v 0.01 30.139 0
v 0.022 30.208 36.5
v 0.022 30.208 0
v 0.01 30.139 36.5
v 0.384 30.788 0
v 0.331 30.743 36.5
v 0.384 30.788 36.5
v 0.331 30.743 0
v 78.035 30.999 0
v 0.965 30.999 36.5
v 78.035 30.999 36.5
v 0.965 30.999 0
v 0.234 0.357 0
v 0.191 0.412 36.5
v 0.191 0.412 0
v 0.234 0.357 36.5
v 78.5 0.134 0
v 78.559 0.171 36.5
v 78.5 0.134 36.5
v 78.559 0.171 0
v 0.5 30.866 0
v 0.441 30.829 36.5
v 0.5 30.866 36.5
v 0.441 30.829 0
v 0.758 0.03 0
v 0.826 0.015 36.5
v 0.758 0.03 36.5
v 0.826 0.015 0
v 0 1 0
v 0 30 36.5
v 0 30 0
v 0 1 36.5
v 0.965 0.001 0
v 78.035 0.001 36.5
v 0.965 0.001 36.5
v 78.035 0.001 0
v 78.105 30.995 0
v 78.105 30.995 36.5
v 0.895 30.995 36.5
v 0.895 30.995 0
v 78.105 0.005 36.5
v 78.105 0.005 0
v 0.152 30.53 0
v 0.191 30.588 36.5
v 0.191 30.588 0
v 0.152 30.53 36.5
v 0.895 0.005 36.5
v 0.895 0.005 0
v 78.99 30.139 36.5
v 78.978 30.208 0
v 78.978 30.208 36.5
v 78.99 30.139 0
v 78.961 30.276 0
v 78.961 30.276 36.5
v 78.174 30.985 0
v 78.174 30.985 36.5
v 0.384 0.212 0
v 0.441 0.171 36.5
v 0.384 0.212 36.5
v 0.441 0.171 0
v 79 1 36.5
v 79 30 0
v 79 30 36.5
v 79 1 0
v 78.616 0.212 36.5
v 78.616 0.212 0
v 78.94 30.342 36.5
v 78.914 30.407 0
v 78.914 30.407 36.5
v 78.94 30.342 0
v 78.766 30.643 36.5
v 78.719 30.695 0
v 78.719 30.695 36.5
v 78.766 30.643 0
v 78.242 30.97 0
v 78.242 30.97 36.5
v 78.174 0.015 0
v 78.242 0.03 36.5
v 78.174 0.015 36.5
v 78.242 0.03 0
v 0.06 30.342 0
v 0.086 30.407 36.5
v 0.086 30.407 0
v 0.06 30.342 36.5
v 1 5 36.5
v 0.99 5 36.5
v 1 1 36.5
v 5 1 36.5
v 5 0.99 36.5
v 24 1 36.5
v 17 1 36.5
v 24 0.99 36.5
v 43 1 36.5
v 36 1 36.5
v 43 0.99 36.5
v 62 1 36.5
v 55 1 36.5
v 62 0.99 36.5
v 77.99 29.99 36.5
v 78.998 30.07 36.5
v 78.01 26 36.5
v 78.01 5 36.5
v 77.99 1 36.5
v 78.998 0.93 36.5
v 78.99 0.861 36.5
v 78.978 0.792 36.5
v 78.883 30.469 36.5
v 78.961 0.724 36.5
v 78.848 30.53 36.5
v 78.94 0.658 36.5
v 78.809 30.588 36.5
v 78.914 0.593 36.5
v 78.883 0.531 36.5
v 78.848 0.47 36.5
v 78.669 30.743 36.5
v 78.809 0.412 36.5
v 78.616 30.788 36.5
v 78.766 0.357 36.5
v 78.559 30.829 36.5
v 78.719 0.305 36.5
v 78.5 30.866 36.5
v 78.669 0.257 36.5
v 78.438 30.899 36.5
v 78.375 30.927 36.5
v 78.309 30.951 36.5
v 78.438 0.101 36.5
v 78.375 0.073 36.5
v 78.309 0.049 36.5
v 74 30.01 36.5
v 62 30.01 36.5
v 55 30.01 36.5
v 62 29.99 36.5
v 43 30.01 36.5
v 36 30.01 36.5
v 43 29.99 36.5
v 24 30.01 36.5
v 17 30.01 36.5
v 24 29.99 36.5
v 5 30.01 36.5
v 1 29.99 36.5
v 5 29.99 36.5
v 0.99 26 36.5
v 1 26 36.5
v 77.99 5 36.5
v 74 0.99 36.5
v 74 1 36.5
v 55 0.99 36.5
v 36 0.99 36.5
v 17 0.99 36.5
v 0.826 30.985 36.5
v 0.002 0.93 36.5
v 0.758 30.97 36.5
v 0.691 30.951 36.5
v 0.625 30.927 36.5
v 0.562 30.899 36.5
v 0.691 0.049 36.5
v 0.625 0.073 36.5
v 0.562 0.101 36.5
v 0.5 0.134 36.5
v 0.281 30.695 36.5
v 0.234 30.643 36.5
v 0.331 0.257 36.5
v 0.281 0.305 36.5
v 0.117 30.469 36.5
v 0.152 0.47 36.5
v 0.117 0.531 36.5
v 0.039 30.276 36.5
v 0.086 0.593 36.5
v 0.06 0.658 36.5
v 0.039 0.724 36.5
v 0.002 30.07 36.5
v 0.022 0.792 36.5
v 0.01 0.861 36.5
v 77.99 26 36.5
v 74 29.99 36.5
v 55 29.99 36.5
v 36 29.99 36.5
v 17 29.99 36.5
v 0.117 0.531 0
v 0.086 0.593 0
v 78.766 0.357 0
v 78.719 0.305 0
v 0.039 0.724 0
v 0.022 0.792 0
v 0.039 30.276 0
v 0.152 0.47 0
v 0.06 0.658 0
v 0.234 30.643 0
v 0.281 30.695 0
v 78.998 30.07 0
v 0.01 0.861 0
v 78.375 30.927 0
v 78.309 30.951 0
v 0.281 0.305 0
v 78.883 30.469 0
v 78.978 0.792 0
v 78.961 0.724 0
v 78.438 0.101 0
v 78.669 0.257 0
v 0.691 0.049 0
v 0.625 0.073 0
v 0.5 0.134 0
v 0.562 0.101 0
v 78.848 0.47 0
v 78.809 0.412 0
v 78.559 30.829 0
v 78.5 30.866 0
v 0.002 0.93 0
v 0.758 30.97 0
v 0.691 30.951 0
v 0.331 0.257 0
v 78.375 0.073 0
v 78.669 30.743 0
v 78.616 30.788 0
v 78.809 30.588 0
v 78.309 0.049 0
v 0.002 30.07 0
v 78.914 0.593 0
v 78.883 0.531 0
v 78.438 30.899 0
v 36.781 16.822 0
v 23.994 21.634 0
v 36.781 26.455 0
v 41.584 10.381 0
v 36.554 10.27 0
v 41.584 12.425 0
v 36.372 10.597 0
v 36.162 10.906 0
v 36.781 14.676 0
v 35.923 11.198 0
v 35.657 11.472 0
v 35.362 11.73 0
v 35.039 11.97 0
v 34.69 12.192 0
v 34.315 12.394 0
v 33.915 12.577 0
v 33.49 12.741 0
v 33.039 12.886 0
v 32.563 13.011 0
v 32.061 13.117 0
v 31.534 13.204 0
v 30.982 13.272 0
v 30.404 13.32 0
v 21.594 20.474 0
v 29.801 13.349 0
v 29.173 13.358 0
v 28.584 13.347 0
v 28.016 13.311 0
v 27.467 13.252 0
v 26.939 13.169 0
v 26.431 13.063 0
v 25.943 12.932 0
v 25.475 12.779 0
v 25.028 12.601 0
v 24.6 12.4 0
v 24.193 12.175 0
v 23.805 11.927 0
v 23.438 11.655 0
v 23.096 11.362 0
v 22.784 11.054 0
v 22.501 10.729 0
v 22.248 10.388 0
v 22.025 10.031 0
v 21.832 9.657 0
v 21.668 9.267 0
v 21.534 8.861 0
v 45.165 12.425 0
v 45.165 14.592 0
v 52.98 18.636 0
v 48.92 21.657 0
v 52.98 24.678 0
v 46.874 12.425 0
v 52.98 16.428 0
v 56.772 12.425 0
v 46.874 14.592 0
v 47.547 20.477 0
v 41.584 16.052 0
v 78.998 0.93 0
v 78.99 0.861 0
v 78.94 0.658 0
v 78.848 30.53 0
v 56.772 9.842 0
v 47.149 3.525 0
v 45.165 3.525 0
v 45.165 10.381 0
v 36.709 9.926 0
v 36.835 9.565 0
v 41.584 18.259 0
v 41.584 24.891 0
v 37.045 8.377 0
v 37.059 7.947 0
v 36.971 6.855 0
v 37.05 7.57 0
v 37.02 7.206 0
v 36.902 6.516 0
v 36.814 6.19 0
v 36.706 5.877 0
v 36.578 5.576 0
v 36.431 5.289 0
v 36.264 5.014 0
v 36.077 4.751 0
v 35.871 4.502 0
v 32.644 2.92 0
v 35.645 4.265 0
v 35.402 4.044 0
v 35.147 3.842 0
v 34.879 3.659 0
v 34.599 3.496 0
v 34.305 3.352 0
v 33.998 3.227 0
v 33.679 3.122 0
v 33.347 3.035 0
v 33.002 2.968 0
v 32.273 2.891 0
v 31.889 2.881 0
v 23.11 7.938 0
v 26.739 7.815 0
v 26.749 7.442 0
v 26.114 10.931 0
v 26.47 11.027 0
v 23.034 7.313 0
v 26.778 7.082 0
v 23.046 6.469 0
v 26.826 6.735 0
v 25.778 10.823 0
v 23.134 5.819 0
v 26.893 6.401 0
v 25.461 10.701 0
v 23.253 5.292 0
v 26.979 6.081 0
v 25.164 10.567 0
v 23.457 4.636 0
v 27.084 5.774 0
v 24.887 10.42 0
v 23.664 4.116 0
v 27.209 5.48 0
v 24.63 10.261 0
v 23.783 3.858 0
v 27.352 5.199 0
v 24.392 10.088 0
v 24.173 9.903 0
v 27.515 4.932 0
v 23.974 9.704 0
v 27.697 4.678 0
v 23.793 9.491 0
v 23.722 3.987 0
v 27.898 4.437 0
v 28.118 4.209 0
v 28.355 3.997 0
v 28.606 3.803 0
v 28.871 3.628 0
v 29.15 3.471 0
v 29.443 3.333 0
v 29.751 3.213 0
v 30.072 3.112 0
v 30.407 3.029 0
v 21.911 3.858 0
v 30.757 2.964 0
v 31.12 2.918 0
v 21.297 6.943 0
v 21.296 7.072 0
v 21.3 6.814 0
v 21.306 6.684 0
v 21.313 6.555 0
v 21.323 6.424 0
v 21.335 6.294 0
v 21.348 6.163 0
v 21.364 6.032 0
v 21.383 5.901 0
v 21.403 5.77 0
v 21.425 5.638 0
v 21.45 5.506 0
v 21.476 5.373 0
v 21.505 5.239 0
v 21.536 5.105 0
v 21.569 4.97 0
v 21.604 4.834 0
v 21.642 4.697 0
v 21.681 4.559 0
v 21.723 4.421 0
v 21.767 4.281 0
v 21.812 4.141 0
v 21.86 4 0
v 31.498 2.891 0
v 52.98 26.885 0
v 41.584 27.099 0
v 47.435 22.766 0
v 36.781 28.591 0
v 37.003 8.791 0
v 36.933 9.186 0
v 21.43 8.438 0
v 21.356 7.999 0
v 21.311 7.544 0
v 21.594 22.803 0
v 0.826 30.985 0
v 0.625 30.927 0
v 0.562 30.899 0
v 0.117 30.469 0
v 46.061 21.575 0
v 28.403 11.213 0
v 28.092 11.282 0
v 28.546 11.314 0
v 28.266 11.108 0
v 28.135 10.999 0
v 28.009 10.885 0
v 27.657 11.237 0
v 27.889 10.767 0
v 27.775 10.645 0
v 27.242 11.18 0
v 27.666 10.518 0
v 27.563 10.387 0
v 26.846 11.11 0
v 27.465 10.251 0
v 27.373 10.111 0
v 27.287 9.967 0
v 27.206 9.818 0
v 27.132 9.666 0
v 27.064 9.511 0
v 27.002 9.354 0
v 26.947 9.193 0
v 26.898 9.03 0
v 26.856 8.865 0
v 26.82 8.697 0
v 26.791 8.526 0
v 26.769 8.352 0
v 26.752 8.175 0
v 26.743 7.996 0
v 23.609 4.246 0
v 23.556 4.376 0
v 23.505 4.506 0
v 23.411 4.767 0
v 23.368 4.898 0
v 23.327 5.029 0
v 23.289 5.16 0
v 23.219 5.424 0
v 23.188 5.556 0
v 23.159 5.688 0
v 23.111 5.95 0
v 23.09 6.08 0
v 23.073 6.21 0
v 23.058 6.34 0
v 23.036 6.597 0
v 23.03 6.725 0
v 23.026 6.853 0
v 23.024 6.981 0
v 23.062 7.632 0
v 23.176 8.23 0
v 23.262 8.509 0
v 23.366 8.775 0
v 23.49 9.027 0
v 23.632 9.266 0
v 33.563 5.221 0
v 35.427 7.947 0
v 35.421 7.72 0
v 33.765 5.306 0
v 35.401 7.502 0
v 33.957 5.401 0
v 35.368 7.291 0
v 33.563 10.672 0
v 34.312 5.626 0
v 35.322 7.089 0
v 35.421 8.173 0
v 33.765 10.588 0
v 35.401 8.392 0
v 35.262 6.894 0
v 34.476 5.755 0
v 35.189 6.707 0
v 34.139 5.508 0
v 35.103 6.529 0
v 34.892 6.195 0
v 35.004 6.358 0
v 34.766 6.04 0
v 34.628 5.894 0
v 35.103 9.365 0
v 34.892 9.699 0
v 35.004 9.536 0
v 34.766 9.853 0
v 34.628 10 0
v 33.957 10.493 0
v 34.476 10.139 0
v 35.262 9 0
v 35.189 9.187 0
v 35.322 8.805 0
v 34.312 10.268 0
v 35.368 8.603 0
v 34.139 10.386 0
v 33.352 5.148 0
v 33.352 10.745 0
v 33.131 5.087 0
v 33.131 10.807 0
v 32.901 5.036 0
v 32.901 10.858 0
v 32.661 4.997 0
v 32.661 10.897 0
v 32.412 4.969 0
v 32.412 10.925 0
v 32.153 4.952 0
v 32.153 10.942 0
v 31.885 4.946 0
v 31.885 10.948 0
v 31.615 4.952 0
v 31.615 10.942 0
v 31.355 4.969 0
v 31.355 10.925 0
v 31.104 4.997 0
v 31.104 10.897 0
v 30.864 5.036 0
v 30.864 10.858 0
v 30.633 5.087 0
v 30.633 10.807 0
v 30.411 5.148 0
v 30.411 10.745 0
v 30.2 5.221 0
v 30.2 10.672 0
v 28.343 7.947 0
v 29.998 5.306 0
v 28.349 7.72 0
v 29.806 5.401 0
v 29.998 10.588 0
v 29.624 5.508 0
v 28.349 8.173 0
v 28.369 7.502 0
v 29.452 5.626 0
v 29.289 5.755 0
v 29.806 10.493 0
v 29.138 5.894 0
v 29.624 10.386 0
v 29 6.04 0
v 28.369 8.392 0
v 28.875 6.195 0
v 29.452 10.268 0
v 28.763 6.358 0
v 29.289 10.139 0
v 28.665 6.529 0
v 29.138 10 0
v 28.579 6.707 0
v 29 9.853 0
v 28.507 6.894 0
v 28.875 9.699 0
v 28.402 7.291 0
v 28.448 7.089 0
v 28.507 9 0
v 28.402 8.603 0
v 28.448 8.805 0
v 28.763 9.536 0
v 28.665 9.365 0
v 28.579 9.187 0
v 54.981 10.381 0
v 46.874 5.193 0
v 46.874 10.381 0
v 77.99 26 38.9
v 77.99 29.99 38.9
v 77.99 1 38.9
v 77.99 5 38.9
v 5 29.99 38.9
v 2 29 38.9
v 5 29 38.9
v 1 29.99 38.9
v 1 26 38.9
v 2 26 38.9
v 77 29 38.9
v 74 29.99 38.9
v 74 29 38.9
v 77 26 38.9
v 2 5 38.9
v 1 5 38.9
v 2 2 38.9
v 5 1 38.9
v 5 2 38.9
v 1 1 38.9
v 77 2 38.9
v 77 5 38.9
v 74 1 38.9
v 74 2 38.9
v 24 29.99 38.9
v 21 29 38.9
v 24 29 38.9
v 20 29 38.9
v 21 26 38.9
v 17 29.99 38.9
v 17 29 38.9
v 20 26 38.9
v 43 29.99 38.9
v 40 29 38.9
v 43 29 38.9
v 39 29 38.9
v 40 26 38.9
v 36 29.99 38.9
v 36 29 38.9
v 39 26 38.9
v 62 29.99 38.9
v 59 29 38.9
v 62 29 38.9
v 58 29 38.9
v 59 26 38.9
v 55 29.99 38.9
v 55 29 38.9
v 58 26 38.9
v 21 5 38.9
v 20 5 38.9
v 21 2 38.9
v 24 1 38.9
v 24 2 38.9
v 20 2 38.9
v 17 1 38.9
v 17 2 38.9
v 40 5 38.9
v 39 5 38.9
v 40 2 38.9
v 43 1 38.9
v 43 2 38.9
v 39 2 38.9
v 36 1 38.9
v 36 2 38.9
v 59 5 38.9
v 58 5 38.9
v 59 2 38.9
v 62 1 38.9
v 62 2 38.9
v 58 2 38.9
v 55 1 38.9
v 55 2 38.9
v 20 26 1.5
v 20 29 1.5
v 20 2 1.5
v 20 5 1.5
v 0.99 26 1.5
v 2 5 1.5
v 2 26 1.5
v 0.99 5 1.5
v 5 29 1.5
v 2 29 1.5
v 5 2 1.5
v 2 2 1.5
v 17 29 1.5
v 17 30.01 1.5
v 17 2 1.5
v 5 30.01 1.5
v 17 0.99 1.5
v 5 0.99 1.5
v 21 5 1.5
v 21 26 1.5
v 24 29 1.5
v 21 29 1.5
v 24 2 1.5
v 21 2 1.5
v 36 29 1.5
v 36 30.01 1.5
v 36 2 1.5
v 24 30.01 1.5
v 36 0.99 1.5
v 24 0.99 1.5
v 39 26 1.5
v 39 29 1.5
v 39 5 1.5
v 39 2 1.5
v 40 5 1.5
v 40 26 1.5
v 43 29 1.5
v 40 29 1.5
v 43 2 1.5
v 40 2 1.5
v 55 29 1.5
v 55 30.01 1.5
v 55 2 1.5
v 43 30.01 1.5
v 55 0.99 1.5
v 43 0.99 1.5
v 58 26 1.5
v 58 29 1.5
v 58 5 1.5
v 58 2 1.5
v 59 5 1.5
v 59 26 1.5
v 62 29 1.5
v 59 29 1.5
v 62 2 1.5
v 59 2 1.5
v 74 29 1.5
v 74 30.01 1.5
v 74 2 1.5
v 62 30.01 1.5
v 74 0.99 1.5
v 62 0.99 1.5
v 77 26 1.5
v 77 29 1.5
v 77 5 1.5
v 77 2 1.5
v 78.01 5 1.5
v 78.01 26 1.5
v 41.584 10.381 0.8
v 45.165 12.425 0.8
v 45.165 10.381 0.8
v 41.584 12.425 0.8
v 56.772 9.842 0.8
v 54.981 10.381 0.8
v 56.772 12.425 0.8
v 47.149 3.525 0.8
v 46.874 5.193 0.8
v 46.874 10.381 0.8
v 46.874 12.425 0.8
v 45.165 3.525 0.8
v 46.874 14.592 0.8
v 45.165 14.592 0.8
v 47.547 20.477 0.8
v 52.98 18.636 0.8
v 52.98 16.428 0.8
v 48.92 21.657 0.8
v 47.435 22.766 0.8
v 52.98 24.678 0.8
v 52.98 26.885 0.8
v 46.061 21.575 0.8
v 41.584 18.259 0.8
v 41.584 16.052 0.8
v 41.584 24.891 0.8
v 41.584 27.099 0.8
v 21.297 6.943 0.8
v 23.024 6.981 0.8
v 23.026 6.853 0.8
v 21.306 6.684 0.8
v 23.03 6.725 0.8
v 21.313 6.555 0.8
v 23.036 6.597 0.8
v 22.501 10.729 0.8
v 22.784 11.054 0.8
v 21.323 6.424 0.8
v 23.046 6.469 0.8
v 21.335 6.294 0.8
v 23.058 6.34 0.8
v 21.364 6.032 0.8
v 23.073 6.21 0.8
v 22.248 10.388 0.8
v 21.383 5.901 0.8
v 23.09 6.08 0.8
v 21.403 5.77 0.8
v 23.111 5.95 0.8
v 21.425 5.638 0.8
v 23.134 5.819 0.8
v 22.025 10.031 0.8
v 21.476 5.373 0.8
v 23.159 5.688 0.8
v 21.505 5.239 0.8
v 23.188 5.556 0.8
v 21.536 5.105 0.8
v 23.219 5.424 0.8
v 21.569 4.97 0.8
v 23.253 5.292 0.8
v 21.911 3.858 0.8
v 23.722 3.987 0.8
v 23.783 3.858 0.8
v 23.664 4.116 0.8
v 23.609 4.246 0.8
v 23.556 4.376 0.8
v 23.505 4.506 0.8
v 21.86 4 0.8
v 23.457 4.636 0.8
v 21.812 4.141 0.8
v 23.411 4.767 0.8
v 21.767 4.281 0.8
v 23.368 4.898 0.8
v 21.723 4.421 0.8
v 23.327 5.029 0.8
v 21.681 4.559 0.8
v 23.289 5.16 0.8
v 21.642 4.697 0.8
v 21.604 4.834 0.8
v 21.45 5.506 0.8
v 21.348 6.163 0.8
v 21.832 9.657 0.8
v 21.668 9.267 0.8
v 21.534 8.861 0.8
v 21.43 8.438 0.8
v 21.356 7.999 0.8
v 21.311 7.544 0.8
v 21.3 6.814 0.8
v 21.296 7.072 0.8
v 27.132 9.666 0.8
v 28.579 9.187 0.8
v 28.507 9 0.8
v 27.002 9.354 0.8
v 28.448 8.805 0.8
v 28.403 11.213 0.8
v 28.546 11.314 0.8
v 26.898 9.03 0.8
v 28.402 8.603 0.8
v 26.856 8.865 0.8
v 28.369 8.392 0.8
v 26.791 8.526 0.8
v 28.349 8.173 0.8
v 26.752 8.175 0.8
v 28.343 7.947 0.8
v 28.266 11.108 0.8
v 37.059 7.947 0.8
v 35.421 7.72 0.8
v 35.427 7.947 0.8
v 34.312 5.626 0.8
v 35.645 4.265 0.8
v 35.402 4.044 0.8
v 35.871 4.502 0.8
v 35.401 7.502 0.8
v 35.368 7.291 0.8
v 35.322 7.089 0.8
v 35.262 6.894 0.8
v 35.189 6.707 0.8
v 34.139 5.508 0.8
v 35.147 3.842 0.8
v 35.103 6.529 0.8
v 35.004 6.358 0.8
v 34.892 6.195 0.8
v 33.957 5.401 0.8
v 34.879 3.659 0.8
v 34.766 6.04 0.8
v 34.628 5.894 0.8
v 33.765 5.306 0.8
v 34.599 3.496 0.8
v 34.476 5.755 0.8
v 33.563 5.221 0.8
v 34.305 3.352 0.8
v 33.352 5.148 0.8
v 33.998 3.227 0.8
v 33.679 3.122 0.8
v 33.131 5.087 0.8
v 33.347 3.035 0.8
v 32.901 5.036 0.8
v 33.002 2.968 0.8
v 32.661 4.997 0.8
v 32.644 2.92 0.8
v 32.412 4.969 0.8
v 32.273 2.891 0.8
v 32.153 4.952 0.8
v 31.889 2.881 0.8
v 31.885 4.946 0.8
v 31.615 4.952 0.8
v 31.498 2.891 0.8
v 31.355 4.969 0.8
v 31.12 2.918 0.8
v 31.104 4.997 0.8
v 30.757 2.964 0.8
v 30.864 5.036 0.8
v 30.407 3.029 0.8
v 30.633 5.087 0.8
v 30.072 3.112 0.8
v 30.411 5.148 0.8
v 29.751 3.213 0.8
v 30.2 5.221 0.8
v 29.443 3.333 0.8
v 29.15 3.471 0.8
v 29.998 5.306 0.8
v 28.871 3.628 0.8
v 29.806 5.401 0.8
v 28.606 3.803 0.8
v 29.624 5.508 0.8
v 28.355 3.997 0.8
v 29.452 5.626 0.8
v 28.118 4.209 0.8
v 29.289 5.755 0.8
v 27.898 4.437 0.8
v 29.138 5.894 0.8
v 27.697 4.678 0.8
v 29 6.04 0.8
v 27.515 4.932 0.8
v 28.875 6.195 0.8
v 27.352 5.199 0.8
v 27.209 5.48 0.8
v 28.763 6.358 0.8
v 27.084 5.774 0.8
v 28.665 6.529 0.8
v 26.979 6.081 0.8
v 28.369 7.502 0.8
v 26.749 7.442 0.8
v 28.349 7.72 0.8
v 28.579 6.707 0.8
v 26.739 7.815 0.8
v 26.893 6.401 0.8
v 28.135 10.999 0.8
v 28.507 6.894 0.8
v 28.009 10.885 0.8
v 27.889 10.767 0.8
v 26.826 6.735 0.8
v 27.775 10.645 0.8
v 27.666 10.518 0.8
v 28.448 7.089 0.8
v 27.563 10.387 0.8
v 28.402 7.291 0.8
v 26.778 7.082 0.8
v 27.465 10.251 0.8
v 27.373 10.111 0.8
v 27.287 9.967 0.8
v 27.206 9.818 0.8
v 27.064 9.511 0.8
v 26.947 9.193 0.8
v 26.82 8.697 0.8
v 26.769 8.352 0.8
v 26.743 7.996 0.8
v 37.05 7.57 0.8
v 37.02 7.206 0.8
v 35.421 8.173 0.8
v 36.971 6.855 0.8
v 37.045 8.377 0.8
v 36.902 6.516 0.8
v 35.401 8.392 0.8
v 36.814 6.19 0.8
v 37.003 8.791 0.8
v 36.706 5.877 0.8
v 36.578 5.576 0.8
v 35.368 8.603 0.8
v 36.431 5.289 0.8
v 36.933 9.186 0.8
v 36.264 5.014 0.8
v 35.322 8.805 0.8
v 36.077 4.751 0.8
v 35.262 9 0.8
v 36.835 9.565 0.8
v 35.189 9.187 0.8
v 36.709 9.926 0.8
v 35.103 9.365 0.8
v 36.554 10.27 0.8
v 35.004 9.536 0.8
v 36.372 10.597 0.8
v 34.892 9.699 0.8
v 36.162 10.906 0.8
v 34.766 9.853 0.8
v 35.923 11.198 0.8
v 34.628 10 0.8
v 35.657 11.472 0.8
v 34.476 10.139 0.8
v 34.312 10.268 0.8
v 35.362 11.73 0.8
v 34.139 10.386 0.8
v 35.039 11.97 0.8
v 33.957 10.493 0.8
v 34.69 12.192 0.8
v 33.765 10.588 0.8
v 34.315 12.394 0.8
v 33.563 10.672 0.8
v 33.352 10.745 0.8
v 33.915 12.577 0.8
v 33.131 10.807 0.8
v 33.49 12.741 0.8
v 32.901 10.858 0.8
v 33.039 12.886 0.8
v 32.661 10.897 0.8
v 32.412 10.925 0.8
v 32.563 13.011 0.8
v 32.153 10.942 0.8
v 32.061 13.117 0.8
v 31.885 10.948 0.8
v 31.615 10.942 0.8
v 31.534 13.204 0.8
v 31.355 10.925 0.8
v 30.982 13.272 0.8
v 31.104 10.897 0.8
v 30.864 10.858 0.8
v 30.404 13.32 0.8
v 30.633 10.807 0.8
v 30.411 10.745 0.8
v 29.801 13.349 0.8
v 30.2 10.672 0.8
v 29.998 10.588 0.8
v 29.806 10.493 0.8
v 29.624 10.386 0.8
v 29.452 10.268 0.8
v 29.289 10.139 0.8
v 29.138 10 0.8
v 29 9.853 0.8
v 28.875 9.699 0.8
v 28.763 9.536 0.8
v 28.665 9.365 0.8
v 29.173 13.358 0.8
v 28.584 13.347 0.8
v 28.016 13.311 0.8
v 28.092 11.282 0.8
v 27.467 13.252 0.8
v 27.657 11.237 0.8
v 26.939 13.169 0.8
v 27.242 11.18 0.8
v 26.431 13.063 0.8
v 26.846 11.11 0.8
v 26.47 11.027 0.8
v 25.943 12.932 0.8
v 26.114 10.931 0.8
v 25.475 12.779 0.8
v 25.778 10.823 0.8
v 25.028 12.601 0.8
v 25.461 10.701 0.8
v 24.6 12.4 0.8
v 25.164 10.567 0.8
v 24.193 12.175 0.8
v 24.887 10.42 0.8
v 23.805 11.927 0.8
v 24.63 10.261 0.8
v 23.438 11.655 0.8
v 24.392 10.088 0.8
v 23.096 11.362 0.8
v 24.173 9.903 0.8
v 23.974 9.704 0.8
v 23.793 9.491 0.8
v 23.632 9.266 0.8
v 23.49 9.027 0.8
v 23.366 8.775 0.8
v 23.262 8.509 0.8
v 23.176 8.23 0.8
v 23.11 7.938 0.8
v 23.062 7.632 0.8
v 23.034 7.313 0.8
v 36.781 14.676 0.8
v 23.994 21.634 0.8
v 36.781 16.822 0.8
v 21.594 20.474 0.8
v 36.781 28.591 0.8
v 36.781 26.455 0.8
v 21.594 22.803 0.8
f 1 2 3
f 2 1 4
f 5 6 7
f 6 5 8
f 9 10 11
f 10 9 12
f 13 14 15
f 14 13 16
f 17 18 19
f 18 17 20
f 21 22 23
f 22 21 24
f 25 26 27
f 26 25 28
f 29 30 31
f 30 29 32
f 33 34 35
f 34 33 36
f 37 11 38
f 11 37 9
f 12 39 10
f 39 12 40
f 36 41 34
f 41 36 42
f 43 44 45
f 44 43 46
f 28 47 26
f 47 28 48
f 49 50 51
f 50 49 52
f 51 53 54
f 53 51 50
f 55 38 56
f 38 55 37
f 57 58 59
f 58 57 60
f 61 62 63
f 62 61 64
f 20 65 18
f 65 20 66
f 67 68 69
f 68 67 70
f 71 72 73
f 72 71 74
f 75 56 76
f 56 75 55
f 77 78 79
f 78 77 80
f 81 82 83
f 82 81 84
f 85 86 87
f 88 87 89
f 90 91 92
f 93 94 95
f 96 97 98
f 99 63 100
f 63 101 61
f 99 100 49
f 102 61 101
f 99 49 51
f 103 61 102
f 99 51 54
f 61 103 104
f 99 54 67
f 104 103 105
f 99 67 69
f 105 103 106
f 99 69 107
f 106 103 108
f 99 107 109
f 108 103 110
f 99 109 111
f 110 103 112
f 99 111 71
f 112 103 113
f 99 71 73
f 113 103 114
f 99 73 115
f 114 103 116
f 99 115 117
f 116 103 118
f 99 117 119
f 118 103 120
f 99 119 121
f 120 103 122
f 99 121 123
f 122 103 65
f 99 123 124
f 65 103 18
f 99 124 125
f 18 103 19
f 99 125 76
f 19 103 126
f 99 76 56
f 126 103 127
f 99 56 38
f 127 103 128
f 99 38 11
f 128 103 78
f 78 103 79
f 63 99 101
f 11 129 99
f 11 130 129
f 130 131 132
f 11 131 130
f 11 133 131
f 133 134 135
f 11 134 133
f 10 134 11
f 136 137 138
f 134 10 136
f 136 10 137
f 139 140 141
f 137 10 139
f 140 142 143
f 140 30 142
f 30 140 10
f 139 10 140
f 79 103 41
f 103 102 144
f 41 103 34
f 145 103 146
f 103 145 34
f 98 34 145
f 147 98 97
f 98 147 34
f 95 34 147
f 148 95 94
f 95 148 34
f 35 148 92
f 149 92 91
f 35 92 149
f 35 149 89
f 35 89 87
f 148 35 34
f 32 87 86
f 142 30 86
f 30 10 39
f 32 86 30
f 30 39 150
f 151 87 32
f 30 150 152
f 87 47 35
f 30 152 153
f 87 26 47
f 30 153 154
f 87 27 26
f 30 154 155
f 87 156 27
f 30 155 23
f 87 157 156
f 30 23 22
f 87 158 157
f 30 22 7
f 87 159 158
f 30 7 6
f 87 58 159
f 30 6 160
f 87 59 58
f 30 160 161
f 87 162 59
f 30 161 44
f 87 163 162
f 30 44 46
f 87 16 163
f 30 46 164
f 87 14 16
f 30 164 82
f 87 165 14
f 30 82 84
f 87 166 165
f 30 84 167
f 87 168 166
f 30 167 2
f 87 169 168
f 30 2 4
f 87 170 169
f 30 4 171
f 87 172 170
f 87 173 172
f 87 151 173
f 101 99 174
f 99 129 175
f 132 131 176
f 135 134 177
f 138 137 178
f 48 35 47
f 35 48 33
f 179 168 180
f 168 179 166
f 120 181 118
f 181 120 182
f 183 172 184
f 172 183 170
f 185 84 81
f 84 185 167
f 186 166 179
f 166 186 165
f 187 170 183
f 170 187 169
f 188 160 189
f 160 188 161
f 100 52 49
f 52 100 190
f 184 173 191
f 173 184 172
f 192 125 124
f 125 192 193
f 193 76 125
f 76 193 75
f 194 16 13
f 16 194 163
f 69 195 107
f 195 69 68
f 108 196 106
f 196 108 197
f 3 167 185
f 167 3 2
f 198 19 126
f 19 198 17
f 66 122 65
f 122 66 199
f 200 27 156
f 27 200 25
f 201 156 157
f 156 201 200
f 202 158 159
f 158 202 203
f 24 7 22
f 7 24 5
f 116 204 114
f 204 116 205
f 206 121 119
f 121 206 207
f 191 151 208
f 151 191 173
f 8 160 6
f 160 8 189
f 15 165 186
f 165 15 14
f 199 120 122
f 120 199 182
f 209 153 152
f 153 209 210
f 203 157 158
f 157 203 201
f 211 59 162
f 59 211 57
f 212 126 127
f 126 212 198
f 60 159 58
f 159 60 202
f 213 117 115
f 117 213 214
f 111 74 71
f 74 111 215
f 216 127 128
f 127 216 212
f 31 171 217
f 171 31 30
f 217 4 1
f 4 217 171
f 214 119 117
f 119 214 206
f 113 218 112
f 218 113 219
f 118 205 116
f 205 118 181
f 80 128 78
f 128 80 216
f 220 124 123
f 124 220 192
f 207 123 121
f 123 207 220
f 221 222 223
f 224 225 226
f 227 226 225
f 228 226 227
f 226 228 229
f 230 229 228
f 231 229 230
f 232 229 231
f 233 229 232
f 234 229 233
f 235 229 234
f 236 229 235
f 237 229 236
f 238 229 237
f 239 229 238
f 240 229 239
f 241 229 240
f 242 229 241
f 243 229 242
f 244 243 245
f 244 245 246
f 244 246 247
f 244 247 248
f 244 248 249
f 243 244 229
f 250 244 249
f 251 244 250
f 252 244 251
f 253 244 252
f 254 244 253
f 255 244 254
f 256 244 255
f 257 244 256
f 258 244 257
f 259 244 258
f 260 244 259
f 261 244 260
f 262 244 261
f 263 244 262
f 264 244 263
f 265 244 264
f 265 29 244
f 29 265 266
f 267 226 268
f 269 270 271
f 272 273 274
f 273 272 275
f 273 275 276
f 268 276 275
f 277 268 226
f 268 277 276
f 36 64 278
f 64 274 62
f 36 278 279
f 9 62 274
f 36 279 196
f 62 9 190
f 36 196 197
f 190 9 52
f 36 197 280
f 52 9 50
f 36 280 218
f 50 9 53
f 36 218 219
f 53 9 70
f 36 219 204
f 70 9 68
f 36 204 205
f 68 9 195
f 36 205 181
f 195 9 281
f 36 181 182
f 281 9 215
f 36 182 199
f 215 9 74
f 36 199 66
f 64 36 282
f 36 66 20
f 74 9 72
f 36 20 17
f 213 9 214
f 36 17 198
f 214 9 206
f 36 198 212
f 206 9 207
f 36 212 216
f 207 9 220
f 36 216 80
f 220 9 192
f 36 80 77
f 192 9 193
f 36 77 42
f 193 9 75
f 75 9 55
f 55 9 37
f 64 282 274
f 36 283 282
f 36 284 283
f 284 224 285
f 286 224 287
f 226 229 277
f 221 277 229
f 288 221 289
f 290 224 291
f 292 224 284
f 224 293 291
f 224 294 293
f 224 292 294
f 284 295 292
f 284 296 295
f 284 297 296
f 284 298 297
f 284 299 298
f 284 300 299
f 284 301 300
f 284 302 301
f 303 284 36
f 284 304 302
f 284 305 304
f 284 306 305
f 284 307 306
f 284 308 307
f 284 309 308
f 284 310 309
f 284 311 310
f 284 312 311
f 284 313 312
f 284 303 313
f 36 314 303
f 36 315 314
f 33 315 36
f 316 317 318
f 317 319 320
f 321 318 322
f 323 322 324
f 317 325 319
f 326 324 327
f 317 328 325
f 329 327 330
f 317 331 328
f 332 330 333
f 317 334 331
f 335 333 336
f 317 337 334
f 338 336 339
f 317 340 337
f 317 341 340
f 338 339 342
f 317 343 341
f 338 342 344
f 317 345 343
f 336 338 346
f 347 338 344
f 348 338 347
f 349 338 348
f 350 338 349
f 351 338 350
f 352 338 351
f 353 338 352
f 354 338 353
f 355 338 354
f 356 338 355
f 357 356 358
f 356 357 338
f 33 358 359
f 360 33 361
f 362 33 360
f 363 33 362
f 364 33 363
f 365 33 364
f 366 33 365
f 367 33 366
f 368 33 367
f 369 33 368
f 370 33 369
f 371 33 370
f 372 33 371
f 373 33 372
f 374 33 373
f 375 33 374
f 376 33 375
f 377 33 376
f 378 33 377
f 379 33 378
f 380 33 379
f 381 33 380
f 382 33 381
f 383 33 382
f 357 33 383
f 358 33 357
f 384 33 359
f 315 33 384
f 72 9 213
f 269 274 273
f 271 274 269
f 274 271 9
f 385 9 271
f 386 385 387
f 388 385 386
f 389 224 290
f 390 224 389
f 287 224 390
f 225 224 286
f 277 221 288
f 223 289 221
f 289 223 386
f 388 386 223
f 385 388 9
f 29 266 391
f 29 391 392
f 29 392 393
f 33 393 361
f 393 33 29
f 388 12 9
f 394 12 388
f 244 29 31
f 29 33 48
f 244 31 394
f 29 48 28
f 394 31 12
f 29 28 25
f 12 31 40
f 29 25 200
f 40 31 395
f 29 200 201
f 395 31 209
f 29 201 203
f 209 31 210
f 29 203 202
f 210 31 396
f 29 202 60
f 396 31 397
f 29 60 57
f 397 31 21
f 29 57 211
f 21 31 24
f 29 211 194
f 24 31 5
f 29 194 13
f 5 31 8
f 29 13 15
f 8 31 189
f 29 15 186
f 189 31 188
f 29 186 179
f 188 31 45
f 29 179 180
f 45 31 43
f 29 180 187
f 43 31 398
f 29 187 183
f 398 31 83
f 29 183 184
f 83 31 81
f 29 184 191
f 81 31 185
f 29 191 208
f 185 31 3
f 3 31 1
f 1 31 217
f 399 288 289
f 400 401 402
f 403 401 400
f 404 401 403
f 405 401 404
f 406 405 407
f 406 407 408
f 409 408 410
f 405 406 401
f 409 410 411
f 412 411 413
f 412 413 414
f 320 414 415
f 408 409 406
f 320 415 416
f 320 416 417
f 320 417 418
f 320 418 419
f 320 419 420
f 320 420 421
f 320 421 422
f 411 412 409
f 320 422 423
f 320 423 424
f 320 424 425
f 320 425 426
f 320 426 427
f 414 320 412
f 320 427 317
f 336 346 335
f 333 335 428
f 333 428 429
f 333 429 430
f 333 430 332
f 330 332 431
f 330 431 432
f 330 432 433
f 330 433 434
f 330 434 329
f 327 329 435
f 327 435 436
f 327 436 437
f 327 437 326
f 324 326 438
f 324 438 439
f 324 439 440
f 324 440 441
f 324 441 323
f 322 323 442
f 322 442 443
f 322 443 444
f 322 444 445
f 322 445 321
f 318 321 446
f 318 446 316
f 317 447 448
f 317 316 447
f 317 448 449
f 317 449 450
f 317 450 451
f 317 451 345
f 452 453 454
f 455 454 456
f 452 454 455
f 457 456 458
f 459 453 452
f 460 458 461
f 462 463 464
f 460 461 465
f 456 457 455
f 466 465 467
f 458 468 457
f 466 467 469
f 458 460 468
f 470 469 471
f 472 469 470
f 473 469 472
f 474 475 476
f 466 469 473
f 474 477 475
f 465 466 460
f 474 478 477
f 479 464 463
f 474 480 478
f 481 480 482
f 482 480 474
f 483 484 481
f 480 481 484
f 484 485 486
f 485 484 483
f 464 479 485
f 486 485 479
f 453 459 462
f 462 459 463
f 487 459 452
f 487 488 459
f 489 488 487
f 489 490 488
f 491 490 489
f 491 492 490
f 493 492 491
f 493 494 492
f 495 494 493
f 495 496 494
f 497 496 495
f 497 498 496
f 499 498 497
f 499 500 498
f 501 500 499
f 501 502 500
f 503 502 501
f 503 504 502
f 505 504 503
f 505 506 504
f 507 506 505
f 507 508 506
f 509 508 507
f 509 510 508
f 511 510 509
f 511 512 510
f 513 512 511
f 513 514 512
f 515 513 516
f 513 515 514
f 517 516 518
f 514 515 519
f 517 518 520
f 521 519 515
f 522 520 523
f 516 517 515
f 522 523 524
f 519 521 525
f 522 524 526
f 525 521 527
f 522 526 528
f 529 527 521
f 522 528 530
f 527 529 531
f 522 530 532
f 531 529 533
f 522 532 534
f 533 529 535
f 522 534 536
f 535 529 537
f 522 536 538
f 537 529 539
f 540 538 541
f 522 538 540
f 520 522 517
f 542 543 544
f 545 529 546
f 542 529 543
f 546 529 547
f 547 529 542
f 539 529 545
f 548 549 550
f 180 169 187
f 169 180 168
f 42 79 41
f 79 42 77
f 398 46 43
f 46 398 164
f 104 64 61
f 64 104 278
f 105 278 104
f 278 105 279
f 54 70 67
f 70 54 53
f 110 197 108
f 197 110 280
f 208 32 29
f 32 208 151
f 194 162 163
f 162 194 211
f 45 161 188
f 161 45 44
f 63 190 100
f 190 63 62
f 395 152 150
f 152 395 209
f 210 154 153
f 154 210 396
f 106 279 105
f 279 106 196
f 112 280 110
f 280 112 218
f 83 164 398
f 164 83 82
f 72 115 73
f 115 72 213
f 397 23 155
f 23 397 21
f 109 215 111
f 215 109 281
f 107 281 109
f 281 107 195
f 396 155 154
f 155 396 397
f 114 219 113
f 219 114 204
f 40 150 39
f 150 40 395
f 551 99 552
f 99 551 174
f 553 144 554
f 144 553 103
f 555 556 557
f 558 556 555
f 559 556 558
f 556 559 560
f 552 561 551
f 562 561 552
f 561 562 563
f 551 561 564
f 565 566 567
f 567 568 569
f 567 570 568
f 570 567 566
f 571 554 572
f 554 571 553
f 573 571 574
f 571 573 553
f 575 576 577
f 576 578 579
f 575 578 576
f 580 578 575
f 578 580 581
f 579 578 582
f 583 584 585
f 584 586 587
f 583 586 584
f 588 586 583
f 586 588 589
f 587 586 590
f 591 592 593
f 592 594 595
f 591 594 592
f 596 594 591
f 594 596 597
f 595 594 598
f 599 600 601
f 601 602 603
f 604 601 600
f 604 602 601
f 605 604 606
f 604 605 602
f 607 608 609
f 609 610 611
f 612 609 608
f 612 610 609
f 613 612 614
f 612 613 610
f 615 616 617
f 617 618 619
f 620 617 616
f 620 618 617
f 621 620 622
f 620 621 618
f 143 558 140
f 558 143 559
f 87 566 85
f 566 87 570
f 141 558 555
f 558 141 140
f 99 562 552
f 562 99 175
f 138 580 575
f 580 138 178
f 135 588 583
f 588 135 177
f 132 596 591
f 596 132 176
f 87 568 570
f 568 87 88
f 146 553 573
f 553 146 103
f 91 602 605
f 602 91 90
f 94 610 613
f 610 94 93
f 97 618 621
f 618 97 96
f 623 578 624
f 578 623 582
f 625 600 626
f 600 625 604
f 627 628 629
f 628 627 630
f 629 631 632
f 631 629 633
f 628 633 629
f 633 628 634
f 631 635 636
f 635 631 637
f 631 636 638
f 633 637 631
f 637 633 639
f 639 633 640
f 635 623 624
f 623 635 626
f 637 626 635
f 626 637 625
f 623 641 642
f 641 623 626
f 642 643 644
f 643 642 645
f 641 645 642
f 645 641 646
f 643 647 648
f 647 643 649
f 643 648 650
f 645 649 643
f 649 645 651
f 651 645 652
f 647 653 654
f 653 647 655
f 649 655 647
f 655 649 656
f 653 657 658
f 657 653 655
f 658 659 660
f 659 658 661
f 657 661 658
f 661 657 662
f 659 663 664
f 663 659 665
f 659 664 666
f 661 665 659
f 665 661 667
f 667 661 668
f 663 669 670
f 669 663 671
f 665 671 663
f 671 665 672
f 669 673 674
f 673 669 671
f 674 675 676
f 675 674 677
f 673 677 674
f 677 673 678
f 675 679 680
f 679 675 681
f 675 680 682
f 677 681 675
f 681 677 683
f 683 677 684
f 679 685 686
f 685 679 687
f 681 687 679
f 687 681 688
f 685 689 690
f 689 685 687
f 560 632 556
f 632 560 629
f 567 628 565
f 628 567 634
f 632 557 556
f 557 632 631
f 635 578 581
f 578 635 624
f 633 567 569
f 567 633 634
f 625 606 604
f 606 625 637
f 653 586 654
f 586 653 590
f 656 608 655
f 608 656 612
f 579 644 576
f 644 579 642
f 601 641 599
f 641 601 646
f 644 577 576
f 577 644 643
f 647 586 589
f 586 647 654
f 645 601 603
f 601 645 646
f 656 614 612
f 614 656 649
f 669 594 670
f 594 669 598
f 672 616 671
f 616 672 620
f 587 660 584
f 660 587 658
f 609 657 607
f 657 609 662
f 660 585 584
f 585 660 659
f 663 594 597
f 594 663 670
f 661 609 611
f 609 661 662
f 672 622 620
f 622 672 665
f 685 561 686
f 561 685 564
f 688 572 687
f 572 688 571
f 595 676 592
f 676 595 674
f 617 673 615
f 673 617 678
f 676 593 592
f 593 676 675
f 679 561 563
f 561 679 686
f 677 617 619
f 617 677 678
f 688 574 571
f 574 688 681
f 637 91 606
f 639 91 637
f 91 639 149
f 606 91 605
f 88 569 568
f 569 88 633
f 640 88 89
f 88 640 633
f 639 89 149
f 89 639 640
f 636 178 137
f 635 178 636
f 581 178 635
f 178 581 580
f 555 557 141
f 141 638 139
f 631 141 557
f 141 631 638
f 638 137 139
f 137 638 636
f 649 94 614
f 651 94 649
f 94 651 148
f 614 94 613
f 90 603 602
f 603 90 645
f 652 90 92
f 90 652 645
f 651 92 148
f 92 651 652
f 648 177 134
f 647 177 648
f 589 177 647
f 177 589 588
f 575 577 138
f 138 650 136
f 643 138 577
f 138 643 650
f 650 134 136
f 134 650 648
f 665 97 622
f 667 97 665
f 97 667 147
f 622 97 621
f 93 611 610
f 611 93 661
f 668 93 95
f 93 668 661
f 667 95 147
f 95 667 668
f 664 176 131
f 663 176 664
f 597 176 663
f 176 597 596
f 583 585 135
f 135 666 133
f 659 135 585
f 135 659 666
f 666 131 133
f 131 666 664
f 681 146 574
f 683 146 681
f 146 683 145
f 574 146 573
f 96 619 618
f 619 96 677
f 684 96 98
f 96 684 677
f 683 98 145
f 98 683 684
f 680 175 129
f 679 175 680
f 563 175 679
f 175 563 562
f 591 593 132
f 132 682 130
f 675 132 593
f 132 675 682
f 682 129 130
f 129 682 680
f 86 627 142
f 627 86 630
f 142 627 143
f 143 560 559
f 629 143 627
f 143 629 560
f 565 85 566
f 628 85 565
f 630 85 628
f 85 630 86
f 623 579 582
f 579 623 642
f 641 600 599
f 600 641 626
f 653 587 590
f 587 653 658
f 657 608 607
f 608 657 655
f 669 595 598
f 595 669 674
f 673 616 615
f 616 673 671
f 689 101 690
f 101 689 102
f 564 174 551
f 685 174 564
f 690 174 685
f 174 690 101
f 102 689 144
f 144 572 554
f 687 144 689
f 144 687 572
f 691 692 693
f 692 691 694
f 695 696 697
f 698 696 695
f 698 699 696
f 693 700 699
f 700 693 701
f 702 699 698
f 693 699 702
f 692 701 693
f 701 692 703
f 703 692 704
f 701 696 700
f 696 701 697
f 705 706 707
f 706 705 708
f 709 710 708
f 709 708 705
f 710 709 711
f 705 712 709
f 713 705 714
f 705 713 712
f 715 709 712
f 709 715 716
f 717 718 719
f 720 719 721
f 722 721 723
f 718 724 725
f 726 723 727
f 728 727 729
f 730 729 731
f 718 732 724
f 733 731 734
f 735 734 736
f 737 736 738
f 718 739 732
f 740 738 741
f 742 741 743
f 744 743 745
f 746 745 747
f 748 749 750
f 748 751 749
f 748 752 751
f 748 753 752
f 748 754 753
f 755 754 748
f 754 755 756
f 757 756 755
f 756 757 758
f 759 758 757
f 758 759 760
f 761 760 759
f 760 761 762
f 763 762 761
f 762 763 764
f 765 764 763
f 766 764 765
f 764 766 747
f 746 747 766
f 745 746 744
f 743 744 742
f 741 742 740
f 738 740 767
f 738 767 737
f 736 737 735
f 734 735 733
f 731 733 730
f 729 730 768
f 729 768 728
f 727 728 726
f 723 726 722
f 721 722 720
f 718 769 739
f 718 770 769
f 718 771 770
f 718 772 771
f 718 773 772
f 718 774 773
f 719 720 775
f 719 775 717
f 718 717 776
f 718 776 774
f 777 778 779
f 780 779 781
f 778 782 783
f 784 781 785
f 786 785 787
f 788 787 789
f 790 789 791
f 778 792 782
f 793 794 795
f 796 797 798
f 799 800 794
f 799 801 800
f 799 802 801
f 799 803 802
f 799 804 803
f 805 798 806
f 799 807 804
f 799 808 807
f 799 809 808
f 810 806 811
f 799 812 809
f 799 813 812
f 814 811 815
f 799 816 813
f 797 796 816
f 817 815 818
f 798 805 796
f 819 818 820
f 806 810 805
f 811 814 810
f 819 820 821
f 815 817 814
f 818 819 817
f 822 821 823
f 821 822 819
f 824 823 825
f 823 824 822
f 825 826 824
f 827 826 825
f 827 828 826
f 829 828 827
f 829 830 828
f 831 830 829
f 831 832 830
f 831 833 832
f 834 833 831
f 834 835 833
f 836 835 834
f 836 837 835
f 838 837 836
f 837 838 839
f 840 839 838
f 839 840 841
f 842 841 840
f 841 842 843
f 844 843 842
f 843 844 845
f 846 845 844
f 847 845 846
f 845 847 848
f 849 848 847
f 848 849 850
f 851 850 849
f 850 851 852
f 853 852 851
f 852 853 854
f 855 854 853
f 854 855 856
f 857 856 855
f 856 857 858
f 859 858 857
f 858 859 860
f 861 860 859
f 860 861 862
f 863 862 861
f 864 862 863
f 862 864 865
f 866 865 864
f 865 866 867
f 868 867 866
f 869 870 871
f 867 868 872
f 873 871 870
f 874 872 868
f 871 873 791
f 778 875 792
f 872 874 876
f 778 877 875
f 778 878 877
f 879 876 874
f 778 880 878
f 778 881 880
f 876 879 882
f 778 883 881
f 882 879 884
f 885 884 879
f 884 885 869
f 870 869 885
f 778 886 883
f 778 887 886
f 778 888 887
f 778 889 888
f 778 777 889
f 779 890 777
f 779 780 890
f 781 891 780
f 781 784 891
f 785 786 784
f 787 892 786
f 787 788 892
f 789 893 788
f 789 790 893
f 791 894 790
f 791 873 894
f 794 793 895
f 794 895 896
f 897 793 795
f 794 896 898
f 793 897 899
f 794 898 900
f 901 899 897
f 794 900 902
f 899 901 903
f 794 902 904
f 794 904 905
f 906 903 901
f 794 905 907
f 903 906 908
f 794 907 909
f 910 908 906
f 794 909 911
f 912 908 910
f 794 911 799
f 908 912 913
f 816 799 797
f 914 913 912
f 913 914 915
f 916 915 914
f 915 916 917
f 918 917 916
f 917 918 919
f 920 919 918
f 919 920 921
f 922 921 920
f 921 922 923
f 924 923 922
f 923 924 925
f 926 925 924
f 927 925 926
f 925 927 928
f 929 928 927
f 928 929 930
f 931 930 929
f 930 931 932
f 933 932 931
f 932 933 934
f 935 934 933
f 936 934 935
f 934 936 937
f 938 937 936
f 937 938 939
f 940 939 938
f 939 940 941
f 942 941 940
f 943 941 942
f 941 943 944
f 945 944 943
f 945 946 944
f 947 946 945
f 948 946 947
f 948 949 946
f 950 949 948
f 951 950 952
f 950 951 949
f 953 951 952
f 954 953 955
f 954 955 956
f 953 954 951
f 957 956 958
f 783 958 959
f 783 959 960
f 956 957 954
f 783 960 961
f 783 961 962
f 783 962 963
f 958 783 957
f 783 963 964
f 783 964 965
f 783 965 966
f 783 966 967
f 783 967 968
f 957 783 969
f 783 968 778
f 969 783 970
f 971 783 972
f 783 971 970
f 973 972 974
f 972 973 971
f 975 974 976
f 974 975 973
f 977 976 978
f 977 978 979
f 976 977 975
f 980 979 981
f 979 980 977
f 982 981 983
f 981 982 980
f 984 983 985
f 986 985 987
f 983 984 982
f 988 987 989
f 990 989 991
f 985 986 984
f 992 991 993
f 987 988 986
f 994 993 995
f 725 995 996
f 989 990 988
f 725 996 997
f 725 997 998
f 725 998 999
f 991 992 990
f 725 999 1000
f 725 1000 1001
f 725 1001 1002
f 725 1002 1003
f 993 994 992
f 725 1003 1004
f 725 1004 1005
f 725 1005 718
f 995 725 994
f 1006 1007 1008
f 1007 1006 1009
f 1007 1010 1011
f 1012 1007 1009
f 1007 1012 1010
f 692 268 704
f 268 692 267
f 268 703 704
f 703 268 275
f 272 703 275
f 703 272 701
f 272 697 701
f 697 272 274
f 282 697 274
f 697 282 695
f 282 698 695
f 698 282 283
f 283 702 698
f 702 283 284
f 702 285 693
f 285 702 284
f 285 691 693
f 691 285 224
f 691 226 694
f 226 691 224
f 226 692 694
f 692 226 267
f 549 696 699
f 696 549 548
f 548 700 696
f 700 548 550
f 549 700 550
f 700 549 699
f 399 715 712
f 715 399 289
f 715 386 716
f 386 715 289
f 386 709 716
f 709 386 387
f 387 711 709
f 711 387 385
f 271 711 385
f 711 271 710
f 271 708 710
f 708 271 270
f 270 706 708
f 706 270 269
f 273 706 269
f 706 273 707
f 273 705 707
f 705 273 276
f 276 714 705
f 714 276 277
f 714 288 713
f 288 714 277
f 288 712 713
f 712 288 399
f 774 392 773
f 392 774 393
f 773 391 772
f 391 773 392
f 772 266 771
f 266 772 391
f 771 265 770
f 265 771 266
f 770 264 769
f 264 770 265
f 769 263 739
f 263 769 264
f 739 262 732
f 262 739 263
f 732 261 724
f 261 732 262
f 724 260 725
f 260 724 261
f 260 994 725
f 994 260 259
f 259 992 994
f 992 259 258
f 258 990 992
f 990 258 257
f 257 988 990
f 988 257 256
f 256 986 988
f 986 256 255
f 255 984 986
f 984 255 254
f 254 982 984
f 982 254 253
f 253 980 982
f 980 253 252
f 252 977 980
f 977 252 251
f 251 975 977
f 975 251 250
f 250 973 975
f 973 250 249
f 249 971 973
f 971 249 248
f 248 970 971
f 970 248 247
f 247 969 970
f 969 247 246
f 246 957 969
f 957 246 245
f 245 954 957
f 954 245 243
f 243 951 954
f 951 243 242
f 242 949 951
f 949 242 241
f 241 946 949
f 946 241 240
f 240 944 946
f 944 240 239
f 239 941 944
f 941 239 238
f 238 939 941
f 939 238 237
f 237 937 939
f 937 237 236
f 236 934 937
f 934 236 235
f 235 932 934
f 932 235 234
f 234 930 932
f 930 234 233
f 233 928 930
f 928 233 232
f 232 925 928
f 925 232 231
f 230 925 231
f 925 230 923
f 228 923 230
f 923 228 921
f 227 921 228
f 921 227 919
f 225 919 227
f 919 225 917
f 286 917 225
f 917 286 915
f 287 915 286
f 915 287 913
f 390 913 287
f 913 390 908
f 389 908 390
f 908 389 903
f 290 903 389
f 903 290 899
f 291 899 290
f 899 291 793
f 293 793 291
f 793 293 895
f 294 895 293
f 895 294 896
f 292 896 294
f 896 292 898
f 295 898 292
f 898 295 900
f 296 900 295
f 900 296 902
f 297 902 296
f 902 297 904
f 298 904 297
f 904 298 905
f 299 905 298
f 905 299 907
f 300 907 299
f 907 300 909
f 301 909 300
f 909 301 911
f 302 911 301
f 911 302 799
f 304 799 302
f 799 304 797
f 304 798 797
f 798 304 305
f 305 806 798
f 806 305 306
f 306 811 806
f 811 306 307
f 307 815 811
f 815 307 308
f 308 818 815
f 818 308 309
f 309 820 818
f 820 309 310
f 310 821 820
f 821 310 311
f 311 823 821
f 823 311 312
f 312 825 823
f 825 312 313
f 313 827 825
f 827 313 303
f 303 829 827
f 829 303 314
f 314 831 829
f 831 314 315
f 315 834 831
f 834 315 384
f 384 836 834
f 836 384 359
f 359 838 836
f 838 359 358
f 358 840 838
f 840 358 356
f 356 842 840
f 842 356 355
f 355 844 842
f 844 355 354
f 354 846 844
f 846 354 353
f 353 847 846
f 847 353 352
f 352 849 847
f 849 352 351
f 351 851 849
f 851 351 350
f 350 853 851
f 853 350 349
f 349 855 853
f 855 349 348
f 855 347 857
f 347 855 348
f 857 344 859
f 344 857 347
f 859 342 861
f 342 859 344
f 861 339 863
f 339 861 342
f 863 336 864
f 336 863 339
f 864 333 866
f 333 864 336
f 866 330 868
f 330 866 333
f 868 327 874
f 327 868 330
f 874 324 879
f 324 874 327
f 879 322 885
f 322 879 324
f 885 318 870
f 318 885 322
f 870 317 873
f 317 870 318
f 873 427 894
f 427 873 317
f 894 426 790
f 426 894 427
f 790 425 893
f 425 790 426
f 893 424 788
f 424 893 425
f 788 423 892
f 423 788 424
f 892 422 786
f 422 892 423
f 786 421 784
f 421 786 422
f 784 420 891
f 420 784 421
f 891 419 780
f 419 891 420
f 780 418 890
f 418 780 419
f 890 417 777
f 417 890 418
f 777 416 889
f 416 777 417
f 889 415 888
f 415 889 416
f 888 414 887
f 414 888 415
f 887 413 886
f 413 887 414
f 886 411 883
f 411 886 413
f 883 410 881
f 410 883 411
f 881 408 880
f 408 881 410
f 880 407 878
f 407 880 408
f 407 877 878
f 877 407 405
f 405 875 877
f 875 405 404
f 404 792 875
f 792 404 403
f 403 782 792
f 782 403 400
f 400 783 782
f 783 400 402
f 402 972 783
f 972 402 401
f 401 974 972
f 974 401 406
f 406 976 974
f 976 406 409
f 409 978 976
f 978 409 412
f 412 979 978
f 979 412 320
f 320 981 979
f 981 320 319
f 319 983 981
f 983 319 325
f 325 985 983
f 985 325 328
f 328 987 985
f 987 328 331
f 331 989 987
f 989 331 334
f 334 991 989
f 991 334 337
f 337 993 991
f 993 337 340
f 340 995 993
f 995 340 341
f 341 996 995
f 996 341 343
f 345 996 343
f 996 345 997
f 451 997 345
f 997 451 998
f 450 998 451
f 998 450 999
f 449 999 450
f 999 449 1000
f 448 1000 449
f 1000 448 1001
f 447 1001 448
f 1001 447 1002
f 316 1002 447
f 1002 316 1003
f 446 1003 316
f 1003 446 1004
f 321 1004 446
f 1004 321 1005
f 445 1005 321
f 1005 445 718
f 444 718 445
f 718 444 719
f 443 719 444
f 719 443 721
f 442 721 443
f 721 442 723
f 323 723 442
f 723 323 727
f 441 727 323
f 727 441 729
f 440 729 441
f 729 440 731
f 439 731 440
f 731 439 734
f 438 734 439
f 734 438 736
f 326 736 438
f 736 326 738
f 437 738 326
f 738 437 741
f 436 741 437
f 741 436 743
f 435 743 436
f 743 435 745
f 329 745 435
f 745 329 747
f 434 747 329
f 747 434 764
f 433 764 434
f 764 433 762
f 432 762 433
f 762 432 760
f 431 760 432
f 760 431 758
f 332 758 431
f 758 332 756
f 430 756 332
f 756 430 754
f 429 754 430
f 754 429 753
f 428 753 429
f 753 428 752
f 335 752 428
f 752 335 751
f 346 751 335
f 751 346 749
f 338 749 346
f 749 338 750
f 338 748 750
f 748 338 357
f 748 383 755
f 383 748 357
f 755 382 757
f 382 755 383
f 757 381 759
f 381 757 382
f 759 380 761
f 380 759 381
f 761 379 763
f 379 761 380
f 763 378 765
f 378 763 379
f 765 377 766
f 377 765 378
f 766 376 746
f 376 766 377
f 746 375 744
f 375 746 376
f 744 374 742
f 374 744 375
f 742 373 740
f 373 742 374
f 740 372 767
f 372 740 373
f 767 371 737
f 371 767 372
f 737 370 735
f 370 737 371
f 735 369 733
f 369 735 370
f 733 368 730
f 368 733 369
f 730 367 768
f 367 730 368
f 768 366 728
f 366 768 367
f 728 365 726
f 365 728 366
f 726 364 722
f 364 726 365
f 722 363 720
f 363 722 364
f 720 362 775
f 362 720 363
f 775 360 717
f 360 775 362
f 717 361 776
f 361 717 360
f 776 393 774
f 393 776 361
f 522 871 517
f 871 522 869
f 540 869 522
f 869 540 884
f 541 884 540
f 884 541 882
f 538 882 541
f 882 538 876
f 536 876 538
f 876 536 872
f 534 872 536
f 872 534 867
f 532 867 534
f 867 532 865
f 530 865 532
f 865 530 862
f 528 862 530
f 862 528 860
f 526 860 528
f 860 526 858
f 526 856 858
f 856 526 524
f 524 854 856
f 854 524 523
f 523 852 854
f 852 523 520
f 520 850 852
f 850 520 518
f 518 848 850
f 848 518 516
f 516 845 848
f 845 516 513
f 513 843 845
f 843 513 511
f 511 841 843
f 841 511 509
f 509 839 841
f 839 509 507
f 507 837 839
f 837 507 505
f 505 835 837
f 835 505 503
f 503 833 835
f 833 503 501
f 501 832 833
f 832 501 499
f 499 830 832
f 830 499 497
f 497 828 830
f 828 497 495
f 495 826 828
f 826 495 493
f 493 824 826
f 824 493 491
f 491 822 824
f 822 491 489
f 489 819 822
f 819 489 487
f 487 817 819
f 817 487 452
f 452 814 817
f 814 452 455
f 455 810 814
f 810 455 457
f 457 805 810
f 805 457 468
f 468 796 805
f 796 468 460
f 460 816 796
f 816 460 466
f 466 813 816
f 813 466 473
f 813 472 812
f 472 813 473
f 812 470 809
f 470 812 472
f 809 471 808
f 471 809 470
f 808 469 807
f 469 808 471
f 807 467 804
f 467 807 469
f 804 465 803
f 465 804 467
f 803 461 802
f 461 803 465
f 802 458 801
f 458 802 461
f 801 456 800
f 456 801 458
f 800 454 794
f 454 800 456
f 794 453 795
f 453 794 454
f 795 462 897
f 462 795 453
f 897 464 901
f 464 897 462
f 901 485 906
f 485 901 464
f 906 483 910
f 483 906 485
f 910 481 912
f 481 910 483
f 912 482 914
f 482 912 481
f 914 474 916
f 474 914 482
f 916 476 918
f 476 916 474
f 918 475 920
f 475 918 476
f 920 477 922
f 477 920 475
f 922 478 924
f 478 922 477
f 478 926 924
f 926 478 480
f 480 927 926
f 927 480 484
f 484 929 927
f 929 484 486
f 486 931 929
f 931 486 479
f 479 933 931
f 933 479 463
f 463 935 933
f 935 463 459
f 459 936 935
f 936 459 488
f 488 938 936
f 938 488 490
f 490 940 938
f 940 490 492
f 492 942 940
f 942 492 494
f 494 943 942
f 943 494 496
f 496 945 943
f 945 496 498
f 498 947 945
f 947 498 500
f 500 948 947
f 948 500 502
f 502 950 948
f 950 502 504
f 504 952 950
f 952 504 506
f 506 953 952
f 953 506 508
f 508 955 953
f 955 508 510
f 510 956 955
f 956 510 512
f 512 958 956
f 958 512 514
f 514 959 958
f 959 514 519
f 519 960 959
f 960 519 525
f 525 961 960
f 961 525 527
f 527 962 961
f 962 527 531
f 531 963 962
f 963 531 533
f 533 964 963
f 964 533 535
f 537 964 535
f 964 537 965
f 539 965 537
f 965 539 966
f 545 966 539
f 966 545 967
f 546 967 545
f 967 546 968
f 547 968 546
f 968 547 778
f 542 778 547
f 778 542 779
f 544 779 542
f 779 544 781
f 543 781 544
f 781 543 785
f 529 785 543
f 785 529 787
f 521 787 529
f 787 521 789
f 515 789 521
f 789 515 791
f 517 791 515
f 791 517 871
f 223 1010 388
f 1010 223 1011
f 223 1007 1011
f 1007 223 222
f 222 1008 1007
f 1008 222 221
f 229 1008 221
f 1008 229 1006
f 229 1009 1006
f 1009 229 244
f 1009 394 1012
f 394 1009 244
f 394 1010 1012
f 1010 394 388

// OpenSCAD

// part type, you will need a top and bottom piece
_part = "bottom"; //[top, bottom]

// 6(L)R61	PP3	RC22	47,5 mm × 25,5 mm × 16,5 mm
// Length 26 : battery fit too tight
// Width 17 : battery fit too tight
_batteryLength = 27;
_batteryWidth = 18;

// height of the battery recess (height of top and bottom piece should be equal to or slightly larger than the battery height)
// used 35 for bottom
// and 13 for top : OK
_insideHeight = 35;

// number of batteries across
_columns = 4; // [1:50]

// number of batteries deep
_rows = 1; // [1:50]

// thickness of the inside walls
_walls = 1;

// thickness of the bottom layer
_base = 1.5;

// height of the lip where the parts overlap, increase the value for a more secure fit
_lipHeight = 2.5;

// gap between the top and bottom pieces, decrease the value for a tighter fit.
_fitGap = 0.1;



// depth of the label (negative values to emboss, positive values to extrude)
_labelDepth = -0.8;


///////////////////////////////////////////////////////////////////////////

/*Text Varibles*/
font = "Impact";
letter_size = 15;
letter_height = 2.5;
letter_line_space = 5;
letter_text_line1 = "4x";
letter_text_line2 = "9V";

y=-10;
x=0;





module multiLine(letter_size, letter_line_space){
  union(){
    for (i = [0 : $children-1])
      translate([0 , -i * (letter_size+letter_line_space), 0 ]) children(i);
  }
}

module drawtext(letter_text_line1, letter_text_line2,x,y,_labelDepth, letter_height, font, letter_size, letter_line_space) { 
    rotate(a=180, v=[0,1,0])
      translate([y,x,_labelDepth])
        linear_extrude(height = 3){
            rotate([0,0,90]) translate([0,0,5]) 
            
            multiLine(letter_size, letter_line_space) {
                text(letter_text_line1, font=font, valign="center", halign="center", size=letter_size);
                text(letter_text_line2, font=font, valign="center", halign="center", size=letter_size);
            }
        }
}

module cylinderAt(r, h, x, y, z) {
	translate([x,y,z]) {
		cylinder(r=r, h=h, center=true);
	}
}

module cubeAt(xyh, x, y) {
	translate([x,y,0]) {
		cube(xyh);
	}
}

module roundRectAt(width, depth, height, rounding, x, y) {
    translate([x,y,0]) {
        roundRect(width, depth, height, rounding);
    }
}
module roundRect(width, depth, height, rounding) {
    translate([rounding,rounding,0])
	minkowski()
	{
        cube([width-rounding, depth-rounding, height-1]);
		cylinder(r=rounding, h=1);
	}
}

module batteryGrid(width, length, height, wall, rows, columns) {

	eps = 0.01;
    wallmultip = 3;

	union() {
        // cylinder
        for (x=[0:1:columns-1]) {
            for (y=[0:1:rows-1]) {
                cubeAt([width, length, height], (x*(width+wall)), (y*(length+wall)));
            }
        }
        for (x=[0:1:columns-1]) {
            for (y=[0:1:rows]) {
                cubeAt([width-(2*wallmultip*wall), wall+2*eps, height], (x*(width+wall))+(wallmultip*wall), (y*(length+wall))-wall-eps);
            }
        }
        for (x=[0:1:columns]) {
            for (y=[0:1:rows-1]) {
                cubeAt([wall+2*eps, length-(2*wallmultip*wall), height], (x*(width+wall))-wall-eps, (y*(length+wall))+(wallmultip*wall));
            }
        }


	}
}

module makeTray(bwidth, blength, height, rows, columns, wall, base, lipHeight, fitGap, label, lfont, ldepth, lheight, letter_height, x, y, letter_line_space) {
    eps = 0.01;
    gridHeight = (lipHeight > 0) ? height + lipHeight - fitGap : height;
    rounding = 1;
    width = (bwidth+wall) * columns + wall;
    depth = (blength+wall) * rows + wall;
    widthwall = width + wall;
    depthwall = depth + wall;
    difference() {
        union() {
            difference() {
                roundRect(widthwall, depthwall, height+base, rounding);
				if (lipHeight < 0) {
                    echo (lipHeight);
                    translate([rounding/2+wall/2-fitGap/2, rounding/2+wall/2-fitGap/2,height+base+lipHeight])
					cube([width+fitGap,depth+fitGap,-lipHeight+eps]);
				}
            }
            cubeAt([width-eps,depth-eps,height+base+lipHeight-fitGap], rounding/2+wall/2, rounding/2+wall/2);
        }
        translate([wall+rounding/2+wall/2,wall+rounding/2+wall/2,base]) batteryGrid(bwidth, blength, gridHeight+eps, wall, rows, columns);

    
        if (ldepth < 0) {
            translate([widthwall/2,depthwall/2,0]) addLabel(label, (-ldepth+eps)/2 - eps, ldepth, lheight, lfont, letter_height, x, y, letter_line_space);
        }
		
		if (ldepth > 0) {
			translate([widthwall/2,depthwall/2,0]) addLabel(label, -(ldepth+eps)/2 + eps, ldepth, lheight, lfont, letter_height, x, y, letter_line_space);
        }
    }
}

module addLabel(label, zoffset, depth, height, font, letter_height, x, y, letter_line_space) {
    if (len(label)>0) {
		if (label[0] != "") {
			drawtext(label[0], label[1], x, y, depth, zoffset, font, height, letter_line_space);
		}
	}
}


module make($fn=90) {

	if (_part == "top") {
		makeTray(_batteryWidth, _batteryLength, _insideHeight, _rows, _columns, _walls, _base, -_lipHeight, _fitGap,
					[letter_text_line1, letter_text_line2], font, _labelDepth, letter_size, letter_height, x, y, letter_line_space);
	} else {
		makeTray(_batteryWidth, _batteryLength, _insideHeight, _rows, _columns, _walls, _base, _lipHeight, _fitGap,
					[letter_text_line1, letter_text_line2], font, _labelDepth, letter_size, letter_height, x, y, letter_line_space);
	}
}


make();
